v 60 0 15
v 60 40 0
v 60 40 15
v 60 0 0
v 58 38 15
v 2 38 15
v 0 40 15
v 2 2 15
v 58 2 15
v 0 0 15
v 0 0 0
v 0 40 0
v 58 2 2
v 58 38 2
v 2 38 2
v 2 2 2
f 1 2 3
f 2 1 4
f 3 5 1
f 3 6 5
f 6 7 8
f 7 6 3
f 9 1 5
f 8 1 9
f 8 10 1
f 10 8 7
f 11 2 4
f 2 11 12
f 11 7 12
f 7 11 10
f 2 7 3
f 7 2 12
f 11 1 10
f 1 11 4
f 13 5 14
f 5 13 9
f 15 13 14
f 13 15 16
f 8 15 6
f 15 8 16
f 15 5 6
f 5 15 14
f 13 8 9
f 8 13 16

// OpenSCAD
/* [Dimensions] */
// Outside width in millimeters
width = 60; // [20:1:150]
// Outside depth in millimeters
depth = 40; // [20:1:150]
// Outside height in millimeters
height = 15; // [5:0.5:60]
// Wall and floor thickness
wall = 2; // [1:0.2:5]

/* [Options] */
// Choose whether the model is a tray or a solid block
style = "tray"; // [tray:Open tray, block:Solid block]
// Add a center divider
divider = false;

/* [Hidden] */
$fn = 48;

difference() {
    cube([width, depth, height]);
    if (style == "tray")
        translate([wall, wall, wall])
            cube([width - 2*wall, depth - 2*wall, height]);
}
if (divider && style == "tray")
    translate([width/2 - wall/2, 0, 0])
        cube([wall, depth, height]);
